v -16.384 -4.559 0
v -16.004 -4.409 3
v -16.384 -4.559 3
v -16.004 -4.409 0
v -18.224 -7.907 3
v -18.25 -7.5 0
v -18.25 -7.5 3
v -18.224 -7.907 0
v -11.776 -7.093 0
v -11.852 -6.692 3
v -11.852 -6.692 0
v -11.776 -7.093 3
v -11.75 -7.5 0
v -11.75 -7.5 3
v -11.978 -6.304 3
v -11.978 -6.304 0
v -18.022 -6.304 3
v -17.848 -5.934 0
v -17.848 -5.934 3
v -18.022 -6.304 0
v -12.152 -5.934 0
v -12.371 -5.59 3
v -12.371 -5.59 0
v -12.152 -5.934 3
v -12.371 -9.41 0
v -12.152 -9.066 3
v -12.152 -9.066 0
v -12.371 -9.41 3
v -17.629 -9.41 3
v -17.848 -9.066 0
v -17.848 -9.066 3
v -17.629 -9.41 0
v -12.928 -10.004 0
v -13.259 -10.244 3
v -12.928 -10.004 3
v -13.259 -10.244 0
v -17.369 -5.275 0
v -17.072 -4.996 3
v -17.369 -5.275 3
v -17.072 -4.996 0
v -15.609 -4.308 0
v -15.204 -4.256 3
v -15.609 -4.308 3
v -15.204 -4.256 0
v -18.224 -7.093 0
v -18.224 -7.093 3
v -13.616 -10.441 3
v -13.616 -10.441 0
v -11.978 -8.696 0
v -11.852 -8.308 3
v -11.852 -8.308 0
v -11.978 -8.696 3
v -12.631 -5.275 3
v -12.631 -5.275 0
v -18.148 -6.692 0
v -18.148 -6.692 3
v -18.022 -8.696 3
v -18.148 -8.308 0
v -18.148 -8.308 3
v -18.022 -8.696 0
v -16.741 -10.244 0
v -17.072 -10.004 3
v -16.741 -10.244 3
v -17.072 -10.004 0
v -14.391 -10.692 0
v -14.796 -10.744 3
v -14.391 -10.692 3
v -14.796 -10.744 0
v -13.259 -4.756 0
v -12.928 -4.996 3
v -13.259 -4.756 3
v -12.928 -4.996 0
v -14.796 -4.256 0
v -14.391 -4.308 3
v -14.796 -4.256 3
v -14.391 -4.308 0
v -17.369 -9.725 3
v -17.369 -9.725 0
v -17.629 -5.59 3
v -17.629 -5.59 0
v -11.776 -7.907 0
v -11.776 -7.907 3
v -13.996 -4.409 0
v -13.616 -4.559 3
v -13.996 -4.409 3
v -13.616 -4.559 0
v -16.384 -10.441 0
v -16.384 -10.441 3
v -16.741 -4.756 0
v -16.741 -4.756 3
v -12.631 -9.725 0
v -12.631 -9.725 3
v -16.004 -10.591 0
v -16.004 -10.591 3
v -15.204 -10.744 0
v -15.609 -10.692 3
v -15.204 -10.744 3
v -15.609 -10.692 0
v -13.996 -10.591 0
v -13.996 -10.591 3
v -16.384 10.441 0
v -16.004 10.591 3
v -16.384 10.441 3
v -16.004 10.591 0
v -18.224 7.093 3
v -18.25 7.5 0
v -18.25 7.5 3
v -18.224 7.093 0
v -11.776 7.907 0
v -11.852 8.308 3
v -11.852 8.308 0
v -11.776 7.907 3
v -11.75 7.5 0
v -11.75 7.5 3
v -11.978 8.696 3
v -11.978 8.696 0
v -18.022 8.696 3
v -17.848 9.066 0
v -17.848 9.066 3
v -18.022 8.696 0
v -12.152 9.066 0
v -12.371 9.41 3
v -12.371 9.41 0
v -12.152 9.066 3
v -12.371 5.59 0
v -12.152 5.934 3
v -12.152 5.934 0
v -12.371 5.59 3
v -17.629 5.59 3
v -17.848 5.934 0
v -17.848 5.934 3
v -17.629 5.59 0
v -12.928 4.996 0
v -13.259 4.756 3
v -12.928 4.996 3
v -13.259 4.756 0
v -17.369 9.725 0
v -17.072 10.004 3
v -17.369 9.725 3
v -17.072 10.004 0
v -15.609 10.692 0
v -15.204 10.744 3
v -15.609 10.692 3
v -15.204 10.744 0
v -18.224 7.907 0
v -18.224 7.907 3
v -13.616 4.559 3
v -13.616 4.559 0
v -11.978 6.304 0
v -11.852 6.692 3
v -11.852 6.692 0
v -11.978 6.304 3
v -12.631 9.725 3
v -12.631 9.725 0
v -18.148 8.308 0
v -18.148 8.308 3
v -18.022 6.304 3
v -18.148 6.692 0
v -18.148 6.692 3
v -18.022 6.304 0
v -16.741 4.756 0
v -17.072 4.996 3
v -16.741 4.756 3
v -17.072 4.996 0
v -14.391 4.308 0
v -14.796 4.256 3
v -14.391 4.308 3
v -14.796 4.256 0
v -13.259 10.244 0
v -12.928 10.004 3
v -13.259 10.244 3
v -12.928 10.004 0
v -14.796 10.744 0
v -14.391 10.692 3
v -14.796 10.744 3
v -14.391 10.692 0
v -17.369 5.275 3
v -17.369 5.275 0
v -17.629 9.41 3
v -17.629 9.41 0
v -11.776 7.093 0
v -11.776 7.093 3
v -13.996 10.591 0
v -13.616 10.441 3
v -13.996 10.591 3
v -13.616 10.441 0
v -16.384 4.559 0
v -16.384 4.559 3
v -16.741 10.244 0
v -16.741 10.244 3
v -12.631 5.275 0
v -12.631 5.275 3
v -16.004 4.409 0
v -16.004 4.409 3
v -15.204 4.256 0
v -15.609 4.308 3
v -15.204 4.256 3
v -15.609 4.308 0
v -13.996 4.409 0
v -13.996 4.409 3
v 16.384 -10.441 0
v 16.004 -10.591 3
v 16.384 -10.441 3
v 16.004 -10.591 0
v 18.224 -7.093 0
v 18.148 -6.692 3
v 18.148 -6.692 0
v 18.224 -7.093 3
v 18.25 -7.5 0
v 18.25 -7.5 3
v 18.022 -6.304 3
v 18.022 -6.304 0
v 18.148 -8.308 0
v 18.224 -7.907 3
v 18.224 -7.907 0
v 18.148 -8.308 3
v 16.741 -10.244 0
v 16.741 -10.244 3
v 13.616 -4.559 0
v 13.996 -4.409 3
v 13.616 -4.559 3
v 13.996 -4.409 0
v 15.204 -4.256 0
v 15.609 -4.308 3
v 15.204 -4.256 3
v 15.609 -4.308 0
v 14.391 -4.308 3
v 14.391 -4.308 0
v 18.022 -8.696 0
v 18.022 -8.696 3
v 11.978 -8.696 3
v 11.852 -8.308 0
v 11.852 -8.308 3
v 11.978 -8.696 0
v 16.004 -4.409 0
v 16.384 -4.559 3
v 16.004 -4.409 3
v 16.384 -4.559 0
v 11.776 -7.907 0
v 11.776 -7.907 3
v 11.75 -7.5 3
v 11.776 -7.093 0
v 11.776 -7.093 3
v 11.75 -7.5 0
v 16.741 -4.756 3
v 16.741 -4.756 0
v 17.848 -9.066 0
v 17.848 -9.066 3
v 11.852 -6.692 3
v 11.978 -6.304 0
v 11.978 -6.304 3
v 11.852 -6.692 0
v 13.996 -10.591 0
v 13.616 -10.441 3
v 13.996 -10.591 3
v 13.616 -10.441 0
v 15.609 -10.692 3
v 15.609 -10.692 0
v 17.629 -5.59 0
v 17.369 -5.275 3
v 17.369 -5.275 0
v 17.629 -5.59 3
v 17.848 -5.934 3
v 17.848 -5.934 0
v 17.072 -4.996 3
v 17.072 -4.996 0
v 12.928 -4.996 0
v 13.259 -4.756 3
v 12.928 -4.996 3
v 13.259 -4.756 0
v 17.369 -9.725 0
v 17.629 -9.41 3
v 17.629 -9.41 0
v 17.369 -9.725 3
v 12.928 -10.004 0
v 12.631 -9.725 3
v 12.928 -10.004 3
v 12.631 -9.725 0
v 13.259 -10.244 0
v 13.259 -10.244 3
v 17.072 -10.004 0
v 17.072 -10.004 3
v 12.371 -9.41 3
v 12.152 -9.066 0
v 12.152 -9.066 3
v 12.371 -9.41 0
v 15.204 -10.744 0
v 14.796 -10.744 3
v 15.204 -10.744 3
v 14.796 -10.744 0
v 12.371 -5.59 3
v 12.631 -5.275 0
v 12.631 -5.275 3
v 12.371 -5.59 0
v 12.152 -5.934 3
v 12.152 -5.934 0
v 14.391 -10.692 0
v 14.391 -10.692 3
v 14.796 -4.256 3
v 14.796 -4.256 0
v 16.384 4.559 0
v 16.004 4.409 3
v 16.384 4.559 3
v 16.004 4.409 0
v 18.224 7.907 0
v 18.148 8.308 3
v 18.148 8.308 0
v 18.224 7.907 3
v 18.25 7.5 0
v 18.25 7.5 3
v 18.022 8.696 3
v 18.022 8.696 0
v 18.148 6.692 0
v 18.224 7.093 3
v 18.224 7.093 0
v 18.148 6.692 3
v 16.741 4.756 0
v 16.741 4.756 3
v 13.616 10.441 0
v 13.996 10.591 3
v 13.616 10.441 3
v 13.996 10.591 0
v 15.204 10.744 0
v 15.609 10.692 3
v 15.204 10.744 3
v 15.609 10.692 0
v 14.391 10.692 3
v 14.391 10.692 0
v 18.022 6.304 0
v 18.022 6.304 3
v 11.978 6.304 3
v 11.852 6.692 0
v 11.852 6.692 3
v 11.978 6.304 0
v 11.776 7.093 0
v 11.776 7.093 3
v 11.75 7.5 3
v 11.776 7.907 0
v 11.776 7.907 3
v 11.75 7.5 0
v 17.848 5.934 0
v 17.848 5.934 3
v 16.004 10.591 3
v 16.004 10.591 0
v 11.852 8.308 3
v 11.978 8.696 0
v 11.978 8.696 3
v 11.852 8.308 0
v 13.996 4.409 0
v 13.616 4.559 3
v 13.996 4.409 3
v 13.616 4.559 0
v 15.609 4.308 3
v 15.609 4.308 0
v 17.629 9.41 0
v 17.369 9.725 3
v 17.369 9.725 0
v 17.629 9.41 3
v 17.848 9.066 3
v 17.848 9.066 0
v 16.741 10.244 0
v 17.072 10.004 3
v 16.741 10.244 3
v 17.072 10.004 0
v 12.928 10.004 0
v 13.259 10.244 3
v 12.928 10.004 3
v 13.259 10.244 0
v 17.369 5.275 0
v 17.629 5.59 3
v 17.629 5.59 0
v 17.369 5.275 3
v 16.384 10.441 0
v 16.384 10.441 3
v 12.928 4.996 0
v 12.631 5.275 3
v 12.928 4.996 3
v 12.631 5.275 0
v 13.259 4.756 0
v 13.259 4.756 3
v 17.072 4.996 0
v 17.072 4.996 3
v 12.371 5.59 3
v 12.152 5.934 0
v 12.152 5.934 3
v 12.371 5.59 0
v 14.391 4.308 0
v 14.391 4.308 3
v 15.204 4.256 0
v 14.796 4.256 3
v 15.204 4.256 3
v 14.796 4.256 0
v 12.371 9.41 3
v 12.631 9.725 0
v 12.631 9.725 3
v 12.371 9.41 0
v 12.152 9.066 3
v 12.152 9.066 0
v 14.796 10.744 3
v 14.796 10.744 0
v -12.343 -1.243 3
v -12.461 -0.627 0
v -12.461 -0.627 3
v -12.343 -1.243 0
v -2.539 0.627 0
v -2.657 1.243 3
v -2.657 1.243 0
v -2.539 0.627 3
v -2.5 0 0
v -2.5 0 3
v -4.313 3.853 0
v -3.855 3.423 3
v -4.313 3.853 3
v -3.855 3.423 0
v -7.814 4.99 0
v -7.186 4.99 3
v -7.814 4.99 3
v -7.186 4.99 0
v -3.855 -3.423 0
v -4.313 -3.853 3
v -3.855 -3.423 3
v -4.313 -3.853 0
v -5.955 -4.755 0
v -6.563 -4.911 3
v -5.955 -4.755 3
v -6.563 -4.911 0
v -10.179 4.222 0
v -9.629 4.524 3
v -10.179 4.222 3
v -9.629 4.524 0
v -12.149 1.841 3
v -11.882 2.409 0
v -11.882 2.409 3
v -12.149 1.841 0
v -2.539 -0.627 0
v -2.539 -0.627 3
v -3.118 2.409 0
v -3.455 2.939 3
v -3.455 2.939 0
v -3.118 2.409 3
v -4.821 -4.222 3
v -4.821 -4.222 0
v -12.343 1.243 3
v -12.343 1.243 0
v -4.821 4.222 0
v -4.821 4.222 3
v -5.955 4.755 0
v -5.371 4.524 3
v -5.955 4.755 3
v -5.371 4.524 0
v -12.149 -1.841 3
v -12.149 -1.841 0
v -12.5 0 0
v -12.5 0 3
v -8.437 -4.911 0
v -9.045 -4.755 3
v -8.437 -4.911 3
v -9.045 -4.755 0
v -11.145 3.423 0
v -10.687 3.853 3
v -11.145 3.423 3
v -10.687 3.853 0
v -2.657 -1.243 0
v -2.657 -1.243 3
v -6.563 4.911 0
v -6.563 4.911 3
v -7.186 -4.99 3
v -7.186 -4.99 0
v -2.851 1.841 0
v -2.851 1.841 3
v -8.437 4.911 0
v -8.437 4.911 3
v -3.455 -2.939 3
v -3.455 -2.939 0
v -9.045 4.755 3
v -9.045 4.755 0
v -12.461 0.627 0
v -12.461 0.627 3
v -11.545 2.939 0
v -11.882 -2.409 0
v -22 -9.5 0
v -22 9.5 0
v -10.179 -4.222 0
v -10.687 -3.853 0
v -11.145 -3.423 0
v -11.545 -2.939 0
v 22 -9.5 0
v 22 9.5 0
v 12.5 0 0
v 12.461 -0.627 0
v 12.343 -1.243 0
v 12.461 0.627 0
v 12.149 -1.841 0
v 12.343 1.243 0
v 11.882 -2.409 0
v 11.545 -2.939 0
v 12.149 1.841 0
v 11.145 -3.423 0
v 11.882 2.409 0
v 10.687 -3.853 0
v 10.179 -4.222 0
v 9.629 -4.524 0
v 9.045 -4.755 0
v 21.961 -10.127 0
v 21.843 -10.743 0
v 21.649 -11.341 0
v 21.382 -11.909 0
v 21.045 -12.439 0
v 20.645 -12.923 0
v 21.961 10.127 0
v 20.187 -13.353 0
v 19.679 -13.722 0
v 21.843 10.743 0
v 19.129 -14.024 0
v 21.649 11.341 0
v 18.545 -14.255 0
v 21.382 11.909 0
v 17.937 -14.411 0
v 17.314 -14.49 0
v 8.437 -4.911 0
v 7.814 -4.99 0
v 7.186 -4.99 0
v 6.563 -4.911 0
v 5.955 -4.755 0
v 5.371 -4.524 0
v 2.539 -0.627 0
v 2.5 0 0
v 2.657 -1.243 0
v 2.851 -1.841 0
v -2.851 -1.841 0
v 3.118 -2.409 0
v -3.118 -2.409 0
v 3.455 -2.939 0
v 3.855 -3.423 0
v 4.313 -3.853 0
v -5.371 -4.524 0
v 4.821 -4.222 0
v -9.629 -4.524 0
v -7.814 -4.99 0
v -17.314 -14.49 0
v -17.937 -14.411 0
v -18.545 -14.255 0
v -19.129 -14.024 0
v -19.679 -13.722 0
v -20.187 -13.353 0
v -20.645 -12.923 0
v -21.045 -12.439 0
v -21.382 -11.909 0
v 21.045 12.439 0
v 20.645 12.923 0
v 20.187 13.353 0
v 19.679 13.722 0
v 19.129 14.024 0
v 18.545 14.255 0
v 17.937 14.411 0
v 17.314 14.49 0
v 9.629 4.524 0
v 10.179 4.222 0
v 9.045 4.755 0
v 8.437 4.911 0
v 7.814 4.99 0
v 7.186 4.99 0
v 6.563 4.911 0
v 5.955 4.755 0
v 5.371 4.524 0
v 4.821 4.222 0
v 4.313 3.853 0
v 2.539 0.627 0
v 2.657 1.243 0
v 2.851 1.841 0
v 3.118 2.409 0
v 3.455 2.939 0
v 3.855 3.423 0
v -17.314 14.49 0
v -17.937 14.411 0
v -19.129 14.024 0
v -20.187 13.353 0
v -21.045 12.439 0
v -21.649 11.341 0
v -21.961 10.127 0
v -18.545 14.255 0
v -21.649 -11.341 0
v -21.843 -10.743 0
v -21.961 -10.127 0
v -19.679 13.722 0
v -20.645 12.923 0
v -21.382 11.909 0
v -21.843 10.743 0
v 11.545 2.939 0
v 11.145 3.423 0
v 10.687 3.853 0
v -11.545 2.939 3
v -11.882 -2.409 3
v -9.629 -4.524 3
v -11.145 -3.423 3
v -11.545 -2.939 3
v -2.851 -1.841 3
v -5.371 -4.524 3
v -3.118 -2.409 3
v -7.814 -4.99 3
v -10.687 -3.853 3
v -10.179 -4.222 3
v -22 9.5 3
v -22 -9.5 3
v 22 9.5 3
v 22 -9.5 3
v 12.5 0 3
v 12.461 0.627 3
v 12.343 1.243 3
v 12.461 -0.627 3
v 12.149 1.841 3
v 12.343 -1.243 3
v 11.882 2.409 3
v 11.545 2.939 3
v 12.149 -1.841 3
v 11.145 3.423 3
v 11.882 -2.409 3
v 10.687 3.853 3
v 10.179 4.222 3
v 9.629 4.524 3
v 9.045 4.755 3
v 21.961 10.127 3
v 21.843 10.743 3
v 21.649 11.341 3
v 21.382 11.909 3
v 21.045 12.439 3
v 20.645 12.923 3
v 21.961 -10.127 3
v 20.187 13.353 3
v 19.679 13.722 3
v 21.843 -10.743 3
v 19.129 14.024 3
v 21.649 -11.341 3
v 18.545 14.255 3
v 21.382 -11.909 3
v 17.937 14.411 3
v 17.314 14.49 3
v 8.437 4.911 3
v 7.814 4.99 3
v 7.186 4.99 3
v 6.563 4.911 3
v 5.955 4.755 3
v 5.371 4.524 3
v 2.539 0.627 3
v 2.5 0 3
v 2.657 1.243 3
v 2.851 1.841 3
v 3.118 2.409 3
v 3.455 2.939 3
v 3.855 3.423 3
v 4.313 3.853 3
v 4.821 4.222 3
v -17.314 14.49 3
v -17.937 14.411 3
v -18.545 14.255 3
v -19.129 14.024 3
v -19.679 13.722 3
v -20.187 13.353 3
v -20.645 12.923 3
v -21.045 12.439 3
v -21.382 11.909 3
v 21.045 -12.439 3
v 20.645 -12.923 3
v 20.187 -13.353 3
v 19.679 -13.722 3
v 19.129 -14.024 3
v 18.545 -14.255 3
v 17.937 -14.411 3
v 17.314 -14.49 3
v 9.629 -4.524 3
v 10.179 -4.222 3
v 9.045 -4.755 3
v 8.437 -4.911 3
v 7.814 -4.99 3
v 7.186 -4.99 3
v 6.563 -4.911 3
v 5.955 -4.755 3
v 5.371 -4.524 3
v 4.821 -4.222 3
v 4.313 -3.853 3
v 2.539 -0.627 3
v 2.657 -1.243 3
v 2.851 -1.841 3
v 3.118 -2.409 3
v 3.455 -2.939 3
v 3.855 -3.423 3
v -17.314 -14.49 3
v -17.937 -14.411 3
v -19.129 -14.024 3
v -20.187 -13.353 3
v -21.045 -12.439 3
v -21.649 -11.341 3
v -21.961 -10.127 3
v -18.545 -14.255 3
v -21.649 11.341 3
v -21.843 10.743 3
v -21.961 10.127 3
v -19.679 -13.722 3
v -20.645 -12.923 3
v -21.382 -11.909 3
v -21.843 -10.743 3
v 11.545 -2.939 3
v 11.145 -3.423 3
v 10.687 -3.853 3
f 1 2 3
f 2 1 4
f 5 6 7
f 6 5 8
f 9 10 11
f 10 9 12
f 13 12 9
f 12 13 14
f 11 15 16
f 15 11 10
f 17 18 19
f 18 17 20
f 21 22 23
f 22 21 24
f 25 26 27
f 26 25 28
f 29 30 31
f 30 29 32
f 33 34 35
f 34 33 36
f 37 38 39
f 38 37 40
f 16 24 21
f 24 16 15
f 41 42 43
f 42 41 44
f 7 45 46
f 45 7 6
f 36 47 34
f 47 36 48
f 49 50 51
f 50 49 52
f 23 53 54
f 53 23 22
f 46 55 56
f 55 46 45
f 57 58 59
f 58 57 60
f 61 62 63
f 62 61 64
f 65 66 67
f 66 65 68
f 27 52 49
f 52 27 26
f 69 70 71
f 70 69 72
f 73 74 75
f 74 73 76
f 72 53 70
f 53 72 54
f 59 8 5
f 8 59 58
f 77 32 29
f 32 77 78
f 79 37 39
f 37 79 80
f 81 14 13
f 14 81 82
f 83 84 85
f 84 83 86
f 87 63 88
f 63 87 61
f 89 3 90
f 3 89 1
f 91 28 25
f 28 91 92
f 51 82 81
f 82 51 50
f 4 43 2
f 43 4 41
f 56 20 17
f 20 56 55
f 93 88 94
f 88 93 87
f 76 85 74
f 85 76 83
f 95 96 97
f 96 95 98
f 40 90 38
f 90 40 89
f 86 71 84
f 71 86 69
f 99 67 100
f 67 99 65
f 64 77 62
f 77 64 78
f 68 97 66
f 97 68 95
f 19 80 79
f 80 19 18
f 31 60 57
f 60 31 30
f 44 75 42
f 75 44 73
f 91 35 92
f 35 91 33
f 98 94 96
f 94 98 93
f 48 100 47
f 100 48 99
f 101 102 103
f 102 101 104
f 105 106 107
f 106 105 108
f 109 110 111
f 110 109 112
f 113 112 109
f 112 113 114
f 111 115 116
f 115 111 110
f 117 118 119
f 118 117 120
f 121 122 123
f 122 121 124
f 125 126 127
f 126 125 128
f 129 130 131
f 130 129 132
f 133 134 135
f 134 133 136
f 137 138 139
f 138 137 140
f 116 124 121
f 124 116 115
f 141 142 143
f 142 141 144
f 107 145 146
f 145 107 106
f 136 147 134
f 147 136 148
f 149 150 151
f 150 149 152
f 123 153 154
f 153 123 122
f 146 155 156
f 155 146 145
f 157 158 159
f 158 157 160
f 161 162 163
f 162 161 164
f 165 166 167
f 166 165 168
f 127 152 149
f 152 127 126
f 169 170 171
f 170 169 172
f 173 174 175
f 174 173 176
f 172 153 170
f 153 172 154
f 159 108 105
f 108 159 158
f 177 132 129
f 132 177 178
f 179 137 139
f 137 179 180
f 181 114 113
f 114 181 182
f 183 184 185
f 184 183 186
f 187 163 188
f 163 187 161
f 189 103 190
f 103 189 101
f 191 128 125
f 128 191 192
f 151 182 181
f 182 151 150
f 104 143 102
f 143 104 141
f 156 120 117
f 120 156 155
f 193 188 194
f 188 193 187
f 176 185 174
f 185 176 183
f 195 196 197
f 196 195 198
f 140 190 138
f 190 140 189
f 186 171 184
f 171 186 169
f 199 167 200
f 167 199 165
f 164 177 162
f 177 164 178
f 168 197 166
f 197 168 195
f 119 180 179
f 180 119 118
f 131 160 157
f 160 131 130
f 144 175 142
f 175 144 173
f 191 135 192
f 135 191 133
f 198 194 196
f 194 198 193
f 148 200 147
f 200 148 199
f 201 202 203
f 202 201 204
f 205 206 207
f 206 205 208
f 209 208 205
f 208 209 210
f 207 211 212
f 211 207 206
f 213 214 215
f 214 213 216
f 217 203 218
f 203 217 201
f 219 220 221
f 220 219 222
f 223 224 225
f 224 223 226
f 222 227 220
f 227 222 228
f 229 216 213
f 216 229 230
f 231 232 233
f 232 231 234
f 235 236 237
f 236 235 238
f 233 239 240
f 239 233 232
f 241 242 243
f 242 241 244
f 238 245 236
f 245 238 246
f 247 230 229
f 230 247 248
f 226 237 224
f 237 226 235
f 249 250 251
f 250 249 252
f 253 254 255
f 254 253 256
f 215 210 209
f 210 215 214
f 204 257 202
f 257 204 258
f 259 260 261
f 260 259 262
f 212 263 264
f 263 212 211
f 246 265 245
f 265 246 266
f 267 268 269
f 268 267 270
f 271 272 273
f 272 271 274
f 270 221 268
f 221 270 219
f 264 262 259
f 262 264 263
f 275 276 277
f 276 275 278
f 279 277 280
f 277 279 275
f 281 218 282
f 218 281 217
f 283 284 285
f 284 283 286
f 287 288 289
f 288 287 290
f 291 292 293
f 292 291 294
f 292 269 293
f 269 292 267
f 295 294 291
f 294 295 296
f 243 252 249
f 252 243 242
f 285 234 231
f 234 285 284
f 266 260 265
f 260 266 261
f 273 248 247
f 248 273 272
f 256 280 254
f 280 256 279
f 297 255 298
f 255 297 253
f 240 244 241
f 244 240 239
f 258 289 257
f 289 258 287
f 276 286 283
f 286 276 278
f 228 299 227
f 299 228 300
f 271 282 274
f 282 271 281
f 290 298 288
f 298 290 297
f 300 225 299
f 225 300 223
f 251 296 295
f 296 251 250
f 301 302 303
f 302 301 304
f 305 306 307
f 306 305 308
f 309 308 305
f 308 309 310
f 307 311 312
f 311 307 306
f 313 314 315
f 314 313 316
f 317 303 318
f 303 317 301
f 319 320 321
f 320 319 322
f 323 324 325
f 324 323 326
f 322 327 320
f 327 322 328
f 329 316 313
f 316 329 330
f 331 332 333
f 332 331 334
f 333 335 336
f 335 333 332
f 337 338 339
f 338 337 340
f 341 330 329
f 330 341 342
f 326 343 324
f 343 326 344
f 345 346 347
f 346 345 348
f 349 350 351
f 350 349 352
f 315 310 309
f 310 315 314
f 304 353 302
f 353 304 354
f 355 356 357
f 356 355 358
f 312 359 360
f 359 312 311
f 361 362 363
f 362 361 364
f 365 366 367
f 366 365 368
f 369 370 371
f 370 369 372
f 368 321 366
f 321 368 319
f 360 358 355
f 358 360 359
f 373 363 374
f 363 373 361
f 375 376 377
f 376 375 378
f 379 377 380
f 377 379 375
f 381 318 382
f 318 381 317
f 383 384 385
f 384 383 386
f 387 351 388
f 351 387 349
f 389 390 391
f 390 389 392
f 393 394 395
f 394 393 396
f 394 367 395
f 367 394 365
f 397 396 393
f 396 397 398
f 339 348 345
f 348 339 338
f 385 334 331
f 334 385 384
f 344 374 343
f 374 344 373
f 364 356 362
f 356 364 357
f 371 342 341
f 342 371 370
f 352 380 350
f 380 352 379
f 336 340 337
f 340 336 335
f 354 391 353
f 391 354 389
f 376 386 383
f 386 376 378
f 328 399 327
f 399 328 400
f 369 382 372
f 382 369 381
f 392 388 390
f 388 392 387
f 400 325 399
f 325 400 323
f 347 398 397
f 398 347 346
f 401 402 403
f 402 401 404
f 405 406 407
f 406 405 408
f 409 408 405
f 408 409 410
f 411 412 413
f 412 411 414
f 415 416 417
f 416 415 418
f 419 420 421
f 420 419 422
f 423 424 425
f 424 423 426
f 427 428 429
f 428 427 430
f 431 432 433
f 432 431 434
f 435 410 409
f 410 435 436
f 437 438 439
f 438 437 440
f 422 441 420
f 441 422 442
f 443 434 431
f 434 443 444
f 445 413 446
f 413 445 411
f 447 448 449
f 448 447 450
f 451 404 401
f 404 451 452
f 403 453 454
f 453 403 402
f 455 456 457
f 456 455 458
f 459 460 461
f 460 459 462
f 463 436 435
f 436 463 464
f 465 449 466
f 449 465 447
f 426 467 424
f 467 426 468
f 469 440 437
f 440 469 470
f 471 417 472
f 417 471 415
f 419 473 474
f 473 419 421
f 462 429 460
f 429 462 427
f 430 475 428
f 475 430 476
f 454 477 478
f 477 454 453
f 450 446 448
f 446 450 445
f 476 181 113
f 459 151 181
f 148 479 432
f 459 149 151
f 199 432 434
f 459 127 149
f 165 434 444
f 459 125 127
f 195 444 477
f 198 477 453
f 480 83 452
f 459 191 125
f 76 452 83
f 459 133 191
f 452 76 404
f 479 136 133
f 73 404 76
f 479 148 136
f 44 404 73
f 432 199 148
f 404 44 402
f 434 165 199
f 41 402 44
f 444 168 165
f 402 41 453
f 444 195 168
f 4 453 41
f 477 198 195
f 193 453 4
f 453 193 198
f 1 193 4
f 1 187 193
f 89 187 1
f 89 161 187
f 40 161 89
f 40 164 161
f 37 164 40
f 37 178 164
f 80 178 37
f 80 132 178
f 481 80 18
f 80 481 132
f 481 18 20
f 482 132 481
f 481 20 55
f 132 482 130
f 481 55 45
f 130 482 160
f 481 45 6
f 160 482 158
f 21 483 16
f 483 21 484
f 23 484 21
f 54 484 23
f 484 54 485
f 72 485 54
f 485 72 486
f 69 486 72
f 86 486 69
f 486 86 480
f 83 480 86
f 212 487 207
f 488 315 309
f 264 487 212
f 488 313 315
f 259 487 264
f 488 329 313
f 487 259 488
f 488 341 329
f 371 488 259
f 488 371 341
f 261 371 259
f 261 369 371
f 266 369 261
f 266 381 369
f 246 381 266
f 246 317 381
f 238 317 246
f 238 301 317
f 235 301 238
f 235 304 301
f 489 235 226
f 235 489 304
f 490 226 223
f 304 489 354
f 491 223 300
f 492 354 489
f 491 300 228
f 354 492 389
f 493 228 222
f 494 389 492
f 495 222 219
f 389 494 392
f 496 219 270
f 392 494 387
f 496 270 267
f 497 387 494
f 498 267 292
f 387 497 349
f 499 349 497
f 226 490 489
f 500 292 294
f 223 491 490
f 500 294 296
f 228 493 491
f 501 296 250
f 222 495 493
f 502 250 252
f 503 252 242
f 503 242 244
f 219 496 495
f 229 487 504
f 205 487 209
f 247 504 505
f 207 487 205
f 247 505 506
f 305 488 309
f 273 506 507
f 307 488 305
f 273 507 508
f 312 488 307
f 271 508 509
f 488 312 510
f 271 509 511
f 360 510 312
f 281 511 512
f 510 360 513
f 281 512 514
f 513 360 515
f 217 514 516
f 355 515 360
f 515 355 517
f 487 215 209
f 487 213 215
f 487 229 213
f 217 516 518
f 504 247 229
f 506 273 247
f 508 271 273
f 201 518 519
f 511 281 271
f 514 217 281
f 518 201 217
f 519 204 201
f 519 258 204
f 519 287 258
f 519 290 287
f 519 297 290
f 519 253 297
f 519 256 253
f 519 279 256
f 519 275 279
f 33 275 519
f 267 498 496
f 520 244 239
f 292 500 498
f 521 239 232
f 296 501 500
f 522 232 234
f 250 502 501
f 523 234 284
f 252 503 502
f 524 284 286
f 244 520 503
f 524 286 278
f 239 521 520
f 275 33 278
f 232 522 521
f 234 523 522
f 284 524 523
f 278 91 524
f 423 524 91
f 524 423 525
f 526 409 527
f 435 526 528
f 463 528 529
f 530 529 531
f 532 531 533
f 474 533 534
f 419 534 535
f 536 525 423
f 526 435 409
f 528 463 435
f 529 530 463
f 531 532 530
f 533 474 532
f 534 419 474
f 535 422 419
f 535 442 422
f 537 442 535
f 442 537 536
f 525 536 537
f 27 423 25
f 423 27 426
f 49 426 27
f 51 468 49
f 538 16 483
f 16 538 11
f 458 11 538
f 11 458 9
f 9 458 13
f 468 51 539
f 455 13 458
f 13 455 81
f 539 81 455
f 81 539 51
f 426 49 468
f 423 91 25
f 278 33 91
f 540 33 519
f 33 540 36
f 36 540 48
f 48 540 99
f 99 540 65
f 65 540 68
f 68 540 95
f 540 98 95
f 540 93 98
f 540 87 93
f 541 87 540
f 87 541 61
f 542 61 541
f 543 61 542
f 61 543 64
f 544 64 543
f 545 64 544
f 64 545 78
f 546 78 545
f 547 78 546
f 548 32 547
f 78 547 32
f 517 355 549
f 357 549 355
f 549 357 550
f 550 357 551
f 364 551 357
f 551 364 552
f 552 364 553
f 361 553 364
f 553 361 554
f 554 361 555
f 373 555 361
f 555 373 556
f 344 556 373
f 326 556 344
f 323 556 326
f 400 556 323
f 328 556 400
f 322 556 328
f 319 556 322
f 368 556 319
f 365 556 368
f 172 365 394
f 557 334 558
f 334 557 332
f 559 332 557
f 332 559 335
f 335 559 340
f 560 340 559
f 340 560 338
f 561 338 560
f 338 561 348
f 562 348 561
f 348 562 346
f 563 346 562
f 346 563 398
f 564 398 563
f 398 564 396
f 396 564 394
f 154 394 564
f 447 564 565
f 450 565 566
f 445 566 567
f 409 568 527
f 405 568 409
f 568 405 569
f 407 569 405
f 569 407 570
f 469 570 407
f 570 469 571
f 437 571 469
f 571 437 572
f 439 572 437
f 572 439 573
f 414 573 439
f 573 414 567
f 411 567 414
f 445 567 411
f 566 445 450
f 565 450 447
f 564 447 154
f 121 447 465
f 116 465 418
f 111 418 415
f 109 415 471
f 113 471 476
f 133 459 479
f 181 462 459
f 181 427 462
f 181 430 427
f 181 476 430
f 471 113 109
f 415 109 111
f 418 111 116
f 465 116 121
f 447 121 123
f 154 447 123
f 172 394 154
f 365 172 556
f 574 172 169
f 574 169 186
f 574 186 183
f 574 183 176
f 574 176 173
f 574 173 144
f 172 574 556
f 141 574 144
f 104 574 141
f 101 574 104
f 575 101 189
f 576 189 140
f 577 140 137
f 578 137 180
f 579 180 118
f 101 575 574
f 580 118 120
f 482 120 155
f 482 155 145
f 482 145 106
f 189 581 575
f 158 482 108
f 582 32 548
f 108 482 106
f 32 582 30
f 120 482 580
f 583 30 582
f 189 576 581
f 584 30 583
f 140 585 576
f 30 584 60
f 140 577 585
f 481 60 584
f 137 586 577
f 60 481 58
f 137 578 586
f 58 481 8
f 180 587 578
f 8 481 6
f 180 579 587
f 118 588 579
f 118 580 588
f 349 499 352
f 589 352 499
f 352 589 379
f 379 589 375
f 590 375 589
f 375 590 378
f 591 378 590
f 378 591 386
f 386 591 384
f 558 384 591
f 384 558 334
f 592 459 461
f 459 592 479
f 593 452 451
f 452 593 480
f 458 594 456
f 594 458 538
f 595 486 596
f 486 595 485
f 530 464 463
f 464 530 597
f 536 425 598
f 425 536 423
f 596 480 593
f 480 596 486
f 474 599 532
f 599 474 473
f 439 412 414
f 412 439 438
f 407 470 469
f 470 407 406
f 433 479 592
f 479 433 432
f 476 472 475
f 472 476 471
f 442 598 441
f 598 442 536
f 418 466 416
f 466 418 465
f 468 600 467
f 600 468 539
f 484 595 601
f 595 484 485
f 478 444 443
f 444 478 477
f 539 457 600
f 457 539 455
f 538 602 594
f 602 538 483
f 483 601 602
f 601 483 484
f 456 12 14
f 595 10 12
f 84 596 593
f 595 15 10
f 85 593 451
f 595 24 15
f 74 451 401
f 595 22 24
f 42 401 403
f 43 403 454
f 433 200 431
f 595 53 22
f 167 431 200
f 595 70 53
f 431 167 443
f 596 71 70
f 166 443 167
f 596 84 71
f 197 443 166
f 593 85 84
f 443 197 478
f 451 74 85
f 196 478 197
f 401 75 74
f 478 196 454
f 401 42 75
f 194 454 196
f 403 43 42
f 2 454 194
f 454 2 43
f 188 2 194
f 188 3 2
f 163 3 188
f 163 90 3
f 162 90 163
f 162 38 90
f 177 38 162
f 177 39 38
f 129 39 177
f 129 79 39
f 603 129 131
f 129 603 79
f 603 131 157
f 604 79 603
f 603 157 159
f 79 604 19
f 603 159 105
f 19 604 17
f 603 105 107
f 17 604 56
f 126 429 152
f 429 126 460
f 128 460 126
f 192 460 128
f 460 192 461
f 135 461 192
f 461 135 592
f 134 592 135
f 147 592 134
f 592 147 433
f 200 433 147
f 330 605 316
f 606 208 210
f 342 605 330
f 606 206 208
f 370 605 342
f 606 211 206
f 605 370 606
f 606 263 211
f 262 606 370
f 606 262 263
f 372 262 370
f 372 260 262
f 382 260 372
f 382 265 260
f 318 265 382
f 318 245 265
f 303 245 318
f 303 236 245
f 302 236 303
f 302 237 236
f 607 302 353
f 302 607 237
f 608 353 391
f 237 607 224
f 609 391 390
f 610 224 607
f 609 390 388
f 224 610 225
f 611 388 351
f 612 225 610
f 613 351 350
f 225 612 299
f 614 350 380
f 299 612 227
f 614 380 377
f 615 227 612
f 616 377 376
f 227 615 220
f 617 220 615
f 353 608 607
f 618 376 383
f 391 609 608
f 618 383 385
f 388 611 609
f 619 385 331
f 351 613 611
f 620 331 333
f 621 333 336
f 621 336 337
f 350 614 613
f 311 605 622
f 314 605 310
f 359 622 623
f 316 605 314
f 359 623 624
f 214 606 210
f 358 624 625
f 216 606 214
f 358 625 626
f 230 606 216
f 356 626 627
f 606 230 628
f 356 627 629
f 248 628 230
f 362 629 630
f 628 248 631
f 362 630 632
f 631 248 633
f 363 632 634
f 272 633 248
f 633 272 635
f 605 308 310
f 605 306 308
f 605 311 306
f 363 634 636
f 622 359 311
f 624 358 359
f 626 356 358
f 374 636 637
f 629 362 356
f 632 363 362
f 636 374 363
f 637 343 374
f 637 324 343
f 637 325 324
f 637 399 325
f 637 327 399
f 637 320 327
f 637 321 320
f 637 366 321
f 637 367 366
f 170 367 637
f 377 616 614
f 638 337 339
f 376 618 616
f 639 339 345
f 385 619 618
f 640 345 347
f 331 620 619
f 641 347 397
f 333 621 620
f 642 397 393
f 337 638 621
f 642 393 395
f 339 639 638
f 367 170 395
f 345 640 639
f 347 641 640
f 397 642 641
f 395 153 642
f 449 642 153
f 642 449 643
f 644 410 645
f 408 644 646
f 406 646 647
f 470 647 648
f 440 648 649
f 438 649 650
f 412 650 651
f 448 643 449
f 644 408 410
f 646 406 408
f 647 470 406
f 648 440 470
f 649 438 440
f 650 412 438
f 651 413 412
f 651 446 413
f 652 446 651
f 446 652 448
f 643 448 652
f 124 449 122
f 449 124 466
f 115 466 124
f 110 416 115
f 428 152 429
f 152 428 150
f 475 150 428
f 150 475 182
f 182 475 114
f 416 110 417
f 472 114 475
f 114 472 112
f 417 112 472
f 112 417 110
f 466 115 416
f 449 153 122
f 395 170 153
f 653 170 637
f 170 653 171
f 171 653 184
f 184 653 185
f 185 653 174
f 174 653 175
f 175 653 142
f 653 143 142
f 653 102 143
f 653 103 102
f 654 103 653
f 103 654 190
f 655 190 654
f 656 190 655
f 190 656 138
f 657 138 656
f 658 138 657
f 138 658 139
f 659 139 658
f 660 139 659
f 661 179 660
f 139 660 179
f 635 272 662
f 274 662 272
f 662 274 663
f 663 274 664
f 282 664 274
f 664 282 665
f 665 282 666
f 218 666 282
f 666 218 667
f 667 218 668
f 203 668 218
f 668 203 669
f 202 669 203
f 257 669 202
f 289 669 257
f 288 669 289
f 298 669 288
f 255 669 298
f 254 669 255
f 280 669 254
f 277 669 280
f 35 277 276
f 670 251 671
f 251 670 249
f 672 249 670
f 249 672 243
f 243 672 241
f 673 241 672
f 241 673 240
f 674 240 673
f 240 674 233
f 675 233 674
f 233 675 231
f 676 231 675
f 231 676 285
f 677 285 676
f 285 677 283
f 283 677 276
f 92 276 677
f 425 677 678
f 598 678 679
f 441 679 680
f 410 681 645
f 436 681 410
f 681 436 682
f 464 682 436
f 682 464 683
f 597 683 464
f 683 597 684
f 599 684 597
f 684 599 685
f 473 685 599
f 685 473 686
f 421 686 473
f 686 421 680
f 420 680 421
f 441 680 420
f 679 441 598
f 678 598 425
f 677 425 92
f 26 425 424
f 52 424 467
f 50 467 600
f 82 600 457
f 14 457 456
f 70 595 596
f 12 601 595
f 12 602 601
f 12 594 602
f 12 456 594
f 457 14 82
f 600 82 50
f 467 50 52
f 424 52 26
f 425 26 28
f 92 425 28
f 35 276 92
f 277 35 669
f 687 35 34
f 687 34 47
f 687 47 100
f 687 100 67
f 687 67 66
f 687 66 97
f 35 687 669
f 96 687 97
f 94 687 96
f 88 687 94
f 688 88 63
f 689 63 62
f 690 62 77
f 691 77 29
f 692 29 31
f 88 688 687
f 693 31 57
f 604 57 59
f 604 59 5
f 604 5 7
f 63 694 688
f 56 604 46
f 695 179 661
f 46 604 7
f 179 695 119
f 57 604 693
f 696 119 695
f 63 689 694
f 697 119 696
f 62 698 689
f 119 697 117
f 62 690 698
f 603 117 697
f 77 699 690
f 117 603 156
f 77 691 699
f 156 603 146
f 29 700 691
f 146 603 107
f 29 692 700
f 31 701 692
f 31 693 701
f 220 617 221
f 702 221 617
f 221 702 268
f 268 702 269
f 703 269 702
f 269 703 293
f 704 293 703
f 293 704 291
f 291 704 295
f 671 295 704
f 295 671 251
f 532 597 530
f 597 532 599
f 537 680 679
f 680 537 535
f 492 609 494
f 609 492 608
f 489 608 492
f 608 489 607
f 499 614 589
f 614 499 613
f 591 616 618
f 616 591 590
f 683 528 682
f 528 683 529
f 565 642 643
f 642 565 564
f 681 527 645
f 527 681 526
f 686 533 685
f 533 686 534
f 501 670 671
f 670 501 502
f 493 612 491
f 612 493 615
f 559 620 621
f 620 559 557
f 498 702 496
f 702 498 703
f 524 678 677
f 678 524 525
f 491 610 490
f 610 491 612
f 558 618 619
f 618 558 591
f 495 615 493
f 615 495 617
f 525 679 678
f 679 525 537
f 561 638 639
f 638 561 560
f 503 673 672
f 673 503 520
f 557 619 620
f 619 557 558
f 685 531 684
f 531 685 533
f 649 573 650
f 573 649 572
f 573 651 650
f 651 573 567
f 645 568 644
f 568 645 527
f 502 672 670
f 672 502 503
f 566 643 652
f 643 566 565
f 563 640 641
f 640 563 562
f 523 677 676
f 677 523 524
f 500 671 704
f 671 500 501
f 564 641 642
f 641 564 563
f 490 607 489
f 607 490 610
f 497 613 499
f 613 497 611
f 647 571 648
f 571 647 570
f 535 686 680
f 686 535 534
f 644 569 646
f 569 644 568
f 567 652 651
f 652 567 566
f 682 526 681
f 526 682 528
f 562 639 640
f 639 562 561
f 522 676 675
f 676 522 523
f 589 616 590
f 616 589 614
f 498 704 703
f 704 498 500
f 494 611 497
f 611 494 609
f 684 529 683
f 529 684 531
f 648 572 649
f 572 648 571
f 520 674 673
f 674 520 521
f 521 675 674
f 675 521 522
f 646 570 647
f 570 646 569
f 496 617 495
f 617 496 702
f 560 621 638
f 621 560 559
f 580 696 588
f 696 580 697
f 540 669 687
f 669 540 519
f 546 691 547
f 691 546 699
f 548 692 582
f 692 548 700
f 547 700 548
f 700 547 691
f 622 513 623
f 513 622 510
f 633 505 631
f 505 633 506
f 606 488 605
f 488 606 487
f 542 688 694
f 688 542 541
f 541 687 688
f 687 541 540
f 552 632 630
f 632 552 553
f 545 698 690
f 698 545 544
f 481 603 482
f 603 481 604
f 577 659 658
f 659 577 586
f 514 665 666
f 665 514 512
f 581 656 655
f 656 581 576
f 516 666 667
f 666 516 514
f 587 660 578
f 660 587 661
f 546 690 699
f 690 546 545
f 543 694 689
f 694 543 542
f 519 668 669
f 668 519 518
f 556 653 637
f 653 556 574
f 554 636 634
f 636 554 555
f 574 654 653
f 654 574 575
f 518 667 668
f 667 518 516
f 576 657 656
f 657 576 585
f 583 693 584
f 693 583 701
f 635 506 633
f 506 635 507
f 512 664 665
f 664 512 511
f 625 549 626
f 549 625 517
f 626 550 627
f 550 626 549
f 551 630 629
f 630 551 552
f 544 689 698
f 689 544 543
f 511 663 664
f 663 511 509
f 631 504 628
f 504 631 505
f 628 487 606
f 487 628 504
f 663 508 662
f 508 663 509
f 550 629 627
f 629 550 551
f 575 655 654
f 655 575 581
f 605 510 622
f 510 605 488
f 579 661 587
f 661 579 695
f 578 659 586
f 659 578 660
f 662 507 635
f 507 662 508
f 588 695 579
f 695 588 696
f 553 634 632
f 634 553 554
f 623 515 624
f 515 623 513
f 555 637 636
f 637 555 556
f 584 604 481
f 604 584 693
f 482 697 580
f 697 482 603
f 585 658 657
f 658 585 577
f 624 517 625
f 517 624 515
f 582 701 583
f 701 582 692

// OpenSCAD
$fn = 50;

difference() {
	union() {
		hull() {
			translate(v = [-17.0, 9.5, 0]) {
				cylinder(h = 3, r = 5);
			}
			translate(v = [17.0, 9.5, 0]) {
				cylinder(h = 3, r = 5);
			}
			translate(v = [-17.0, -9.5, 0]) {
				cylinder(h = 3, r = 5);
			}
			translate(v = [17.0, -9.5, 0]) {
				cylinder(h = 3, r = 5);
			}
		}
	}
	union() {
		translate(v = [-15.0, -7.5, -100.0]) {
			cylinder(h = 200, r = 3.25);
		}
		translate(v = [-15.0, 7.5, -100.0]) {
			cylinder(h = 200, r = 3.25);
		}
		translate(v = [15.0, -7.5, -100.0]) {
			cylinder(h = 200, r = 3.25);
		}
		translate(v = [15.0, 7.5, -100.0]) {
			cylinder(h = 200, r = 3.25);
		}
		translate(v = [-15.0, -7.5, -100.0]) {
			cylinder(h = 200, r = 1.8);
		}
		translate(v = [-15.0, 7.5, -100.0]) {
			cylinder(h = 200, r = 1.8);
		}
		translate(v = [15.0, -7.5, -100.0]) {
			cylinder(h = 200, r = 1.8);
		}
		translate(v = [15.0, 7.5, -100.0]) {
			cylinder(h = 200, r = 1.8);
		}
		translate(v = [-7.5, 0, 0.0]) {
			cylinder(h = 3, r = 5.0);
		}
		translate(v = [7.5, 0, 0.0]) {
			cylinder(h = 3, r = 5.0);
		}
	}
}
